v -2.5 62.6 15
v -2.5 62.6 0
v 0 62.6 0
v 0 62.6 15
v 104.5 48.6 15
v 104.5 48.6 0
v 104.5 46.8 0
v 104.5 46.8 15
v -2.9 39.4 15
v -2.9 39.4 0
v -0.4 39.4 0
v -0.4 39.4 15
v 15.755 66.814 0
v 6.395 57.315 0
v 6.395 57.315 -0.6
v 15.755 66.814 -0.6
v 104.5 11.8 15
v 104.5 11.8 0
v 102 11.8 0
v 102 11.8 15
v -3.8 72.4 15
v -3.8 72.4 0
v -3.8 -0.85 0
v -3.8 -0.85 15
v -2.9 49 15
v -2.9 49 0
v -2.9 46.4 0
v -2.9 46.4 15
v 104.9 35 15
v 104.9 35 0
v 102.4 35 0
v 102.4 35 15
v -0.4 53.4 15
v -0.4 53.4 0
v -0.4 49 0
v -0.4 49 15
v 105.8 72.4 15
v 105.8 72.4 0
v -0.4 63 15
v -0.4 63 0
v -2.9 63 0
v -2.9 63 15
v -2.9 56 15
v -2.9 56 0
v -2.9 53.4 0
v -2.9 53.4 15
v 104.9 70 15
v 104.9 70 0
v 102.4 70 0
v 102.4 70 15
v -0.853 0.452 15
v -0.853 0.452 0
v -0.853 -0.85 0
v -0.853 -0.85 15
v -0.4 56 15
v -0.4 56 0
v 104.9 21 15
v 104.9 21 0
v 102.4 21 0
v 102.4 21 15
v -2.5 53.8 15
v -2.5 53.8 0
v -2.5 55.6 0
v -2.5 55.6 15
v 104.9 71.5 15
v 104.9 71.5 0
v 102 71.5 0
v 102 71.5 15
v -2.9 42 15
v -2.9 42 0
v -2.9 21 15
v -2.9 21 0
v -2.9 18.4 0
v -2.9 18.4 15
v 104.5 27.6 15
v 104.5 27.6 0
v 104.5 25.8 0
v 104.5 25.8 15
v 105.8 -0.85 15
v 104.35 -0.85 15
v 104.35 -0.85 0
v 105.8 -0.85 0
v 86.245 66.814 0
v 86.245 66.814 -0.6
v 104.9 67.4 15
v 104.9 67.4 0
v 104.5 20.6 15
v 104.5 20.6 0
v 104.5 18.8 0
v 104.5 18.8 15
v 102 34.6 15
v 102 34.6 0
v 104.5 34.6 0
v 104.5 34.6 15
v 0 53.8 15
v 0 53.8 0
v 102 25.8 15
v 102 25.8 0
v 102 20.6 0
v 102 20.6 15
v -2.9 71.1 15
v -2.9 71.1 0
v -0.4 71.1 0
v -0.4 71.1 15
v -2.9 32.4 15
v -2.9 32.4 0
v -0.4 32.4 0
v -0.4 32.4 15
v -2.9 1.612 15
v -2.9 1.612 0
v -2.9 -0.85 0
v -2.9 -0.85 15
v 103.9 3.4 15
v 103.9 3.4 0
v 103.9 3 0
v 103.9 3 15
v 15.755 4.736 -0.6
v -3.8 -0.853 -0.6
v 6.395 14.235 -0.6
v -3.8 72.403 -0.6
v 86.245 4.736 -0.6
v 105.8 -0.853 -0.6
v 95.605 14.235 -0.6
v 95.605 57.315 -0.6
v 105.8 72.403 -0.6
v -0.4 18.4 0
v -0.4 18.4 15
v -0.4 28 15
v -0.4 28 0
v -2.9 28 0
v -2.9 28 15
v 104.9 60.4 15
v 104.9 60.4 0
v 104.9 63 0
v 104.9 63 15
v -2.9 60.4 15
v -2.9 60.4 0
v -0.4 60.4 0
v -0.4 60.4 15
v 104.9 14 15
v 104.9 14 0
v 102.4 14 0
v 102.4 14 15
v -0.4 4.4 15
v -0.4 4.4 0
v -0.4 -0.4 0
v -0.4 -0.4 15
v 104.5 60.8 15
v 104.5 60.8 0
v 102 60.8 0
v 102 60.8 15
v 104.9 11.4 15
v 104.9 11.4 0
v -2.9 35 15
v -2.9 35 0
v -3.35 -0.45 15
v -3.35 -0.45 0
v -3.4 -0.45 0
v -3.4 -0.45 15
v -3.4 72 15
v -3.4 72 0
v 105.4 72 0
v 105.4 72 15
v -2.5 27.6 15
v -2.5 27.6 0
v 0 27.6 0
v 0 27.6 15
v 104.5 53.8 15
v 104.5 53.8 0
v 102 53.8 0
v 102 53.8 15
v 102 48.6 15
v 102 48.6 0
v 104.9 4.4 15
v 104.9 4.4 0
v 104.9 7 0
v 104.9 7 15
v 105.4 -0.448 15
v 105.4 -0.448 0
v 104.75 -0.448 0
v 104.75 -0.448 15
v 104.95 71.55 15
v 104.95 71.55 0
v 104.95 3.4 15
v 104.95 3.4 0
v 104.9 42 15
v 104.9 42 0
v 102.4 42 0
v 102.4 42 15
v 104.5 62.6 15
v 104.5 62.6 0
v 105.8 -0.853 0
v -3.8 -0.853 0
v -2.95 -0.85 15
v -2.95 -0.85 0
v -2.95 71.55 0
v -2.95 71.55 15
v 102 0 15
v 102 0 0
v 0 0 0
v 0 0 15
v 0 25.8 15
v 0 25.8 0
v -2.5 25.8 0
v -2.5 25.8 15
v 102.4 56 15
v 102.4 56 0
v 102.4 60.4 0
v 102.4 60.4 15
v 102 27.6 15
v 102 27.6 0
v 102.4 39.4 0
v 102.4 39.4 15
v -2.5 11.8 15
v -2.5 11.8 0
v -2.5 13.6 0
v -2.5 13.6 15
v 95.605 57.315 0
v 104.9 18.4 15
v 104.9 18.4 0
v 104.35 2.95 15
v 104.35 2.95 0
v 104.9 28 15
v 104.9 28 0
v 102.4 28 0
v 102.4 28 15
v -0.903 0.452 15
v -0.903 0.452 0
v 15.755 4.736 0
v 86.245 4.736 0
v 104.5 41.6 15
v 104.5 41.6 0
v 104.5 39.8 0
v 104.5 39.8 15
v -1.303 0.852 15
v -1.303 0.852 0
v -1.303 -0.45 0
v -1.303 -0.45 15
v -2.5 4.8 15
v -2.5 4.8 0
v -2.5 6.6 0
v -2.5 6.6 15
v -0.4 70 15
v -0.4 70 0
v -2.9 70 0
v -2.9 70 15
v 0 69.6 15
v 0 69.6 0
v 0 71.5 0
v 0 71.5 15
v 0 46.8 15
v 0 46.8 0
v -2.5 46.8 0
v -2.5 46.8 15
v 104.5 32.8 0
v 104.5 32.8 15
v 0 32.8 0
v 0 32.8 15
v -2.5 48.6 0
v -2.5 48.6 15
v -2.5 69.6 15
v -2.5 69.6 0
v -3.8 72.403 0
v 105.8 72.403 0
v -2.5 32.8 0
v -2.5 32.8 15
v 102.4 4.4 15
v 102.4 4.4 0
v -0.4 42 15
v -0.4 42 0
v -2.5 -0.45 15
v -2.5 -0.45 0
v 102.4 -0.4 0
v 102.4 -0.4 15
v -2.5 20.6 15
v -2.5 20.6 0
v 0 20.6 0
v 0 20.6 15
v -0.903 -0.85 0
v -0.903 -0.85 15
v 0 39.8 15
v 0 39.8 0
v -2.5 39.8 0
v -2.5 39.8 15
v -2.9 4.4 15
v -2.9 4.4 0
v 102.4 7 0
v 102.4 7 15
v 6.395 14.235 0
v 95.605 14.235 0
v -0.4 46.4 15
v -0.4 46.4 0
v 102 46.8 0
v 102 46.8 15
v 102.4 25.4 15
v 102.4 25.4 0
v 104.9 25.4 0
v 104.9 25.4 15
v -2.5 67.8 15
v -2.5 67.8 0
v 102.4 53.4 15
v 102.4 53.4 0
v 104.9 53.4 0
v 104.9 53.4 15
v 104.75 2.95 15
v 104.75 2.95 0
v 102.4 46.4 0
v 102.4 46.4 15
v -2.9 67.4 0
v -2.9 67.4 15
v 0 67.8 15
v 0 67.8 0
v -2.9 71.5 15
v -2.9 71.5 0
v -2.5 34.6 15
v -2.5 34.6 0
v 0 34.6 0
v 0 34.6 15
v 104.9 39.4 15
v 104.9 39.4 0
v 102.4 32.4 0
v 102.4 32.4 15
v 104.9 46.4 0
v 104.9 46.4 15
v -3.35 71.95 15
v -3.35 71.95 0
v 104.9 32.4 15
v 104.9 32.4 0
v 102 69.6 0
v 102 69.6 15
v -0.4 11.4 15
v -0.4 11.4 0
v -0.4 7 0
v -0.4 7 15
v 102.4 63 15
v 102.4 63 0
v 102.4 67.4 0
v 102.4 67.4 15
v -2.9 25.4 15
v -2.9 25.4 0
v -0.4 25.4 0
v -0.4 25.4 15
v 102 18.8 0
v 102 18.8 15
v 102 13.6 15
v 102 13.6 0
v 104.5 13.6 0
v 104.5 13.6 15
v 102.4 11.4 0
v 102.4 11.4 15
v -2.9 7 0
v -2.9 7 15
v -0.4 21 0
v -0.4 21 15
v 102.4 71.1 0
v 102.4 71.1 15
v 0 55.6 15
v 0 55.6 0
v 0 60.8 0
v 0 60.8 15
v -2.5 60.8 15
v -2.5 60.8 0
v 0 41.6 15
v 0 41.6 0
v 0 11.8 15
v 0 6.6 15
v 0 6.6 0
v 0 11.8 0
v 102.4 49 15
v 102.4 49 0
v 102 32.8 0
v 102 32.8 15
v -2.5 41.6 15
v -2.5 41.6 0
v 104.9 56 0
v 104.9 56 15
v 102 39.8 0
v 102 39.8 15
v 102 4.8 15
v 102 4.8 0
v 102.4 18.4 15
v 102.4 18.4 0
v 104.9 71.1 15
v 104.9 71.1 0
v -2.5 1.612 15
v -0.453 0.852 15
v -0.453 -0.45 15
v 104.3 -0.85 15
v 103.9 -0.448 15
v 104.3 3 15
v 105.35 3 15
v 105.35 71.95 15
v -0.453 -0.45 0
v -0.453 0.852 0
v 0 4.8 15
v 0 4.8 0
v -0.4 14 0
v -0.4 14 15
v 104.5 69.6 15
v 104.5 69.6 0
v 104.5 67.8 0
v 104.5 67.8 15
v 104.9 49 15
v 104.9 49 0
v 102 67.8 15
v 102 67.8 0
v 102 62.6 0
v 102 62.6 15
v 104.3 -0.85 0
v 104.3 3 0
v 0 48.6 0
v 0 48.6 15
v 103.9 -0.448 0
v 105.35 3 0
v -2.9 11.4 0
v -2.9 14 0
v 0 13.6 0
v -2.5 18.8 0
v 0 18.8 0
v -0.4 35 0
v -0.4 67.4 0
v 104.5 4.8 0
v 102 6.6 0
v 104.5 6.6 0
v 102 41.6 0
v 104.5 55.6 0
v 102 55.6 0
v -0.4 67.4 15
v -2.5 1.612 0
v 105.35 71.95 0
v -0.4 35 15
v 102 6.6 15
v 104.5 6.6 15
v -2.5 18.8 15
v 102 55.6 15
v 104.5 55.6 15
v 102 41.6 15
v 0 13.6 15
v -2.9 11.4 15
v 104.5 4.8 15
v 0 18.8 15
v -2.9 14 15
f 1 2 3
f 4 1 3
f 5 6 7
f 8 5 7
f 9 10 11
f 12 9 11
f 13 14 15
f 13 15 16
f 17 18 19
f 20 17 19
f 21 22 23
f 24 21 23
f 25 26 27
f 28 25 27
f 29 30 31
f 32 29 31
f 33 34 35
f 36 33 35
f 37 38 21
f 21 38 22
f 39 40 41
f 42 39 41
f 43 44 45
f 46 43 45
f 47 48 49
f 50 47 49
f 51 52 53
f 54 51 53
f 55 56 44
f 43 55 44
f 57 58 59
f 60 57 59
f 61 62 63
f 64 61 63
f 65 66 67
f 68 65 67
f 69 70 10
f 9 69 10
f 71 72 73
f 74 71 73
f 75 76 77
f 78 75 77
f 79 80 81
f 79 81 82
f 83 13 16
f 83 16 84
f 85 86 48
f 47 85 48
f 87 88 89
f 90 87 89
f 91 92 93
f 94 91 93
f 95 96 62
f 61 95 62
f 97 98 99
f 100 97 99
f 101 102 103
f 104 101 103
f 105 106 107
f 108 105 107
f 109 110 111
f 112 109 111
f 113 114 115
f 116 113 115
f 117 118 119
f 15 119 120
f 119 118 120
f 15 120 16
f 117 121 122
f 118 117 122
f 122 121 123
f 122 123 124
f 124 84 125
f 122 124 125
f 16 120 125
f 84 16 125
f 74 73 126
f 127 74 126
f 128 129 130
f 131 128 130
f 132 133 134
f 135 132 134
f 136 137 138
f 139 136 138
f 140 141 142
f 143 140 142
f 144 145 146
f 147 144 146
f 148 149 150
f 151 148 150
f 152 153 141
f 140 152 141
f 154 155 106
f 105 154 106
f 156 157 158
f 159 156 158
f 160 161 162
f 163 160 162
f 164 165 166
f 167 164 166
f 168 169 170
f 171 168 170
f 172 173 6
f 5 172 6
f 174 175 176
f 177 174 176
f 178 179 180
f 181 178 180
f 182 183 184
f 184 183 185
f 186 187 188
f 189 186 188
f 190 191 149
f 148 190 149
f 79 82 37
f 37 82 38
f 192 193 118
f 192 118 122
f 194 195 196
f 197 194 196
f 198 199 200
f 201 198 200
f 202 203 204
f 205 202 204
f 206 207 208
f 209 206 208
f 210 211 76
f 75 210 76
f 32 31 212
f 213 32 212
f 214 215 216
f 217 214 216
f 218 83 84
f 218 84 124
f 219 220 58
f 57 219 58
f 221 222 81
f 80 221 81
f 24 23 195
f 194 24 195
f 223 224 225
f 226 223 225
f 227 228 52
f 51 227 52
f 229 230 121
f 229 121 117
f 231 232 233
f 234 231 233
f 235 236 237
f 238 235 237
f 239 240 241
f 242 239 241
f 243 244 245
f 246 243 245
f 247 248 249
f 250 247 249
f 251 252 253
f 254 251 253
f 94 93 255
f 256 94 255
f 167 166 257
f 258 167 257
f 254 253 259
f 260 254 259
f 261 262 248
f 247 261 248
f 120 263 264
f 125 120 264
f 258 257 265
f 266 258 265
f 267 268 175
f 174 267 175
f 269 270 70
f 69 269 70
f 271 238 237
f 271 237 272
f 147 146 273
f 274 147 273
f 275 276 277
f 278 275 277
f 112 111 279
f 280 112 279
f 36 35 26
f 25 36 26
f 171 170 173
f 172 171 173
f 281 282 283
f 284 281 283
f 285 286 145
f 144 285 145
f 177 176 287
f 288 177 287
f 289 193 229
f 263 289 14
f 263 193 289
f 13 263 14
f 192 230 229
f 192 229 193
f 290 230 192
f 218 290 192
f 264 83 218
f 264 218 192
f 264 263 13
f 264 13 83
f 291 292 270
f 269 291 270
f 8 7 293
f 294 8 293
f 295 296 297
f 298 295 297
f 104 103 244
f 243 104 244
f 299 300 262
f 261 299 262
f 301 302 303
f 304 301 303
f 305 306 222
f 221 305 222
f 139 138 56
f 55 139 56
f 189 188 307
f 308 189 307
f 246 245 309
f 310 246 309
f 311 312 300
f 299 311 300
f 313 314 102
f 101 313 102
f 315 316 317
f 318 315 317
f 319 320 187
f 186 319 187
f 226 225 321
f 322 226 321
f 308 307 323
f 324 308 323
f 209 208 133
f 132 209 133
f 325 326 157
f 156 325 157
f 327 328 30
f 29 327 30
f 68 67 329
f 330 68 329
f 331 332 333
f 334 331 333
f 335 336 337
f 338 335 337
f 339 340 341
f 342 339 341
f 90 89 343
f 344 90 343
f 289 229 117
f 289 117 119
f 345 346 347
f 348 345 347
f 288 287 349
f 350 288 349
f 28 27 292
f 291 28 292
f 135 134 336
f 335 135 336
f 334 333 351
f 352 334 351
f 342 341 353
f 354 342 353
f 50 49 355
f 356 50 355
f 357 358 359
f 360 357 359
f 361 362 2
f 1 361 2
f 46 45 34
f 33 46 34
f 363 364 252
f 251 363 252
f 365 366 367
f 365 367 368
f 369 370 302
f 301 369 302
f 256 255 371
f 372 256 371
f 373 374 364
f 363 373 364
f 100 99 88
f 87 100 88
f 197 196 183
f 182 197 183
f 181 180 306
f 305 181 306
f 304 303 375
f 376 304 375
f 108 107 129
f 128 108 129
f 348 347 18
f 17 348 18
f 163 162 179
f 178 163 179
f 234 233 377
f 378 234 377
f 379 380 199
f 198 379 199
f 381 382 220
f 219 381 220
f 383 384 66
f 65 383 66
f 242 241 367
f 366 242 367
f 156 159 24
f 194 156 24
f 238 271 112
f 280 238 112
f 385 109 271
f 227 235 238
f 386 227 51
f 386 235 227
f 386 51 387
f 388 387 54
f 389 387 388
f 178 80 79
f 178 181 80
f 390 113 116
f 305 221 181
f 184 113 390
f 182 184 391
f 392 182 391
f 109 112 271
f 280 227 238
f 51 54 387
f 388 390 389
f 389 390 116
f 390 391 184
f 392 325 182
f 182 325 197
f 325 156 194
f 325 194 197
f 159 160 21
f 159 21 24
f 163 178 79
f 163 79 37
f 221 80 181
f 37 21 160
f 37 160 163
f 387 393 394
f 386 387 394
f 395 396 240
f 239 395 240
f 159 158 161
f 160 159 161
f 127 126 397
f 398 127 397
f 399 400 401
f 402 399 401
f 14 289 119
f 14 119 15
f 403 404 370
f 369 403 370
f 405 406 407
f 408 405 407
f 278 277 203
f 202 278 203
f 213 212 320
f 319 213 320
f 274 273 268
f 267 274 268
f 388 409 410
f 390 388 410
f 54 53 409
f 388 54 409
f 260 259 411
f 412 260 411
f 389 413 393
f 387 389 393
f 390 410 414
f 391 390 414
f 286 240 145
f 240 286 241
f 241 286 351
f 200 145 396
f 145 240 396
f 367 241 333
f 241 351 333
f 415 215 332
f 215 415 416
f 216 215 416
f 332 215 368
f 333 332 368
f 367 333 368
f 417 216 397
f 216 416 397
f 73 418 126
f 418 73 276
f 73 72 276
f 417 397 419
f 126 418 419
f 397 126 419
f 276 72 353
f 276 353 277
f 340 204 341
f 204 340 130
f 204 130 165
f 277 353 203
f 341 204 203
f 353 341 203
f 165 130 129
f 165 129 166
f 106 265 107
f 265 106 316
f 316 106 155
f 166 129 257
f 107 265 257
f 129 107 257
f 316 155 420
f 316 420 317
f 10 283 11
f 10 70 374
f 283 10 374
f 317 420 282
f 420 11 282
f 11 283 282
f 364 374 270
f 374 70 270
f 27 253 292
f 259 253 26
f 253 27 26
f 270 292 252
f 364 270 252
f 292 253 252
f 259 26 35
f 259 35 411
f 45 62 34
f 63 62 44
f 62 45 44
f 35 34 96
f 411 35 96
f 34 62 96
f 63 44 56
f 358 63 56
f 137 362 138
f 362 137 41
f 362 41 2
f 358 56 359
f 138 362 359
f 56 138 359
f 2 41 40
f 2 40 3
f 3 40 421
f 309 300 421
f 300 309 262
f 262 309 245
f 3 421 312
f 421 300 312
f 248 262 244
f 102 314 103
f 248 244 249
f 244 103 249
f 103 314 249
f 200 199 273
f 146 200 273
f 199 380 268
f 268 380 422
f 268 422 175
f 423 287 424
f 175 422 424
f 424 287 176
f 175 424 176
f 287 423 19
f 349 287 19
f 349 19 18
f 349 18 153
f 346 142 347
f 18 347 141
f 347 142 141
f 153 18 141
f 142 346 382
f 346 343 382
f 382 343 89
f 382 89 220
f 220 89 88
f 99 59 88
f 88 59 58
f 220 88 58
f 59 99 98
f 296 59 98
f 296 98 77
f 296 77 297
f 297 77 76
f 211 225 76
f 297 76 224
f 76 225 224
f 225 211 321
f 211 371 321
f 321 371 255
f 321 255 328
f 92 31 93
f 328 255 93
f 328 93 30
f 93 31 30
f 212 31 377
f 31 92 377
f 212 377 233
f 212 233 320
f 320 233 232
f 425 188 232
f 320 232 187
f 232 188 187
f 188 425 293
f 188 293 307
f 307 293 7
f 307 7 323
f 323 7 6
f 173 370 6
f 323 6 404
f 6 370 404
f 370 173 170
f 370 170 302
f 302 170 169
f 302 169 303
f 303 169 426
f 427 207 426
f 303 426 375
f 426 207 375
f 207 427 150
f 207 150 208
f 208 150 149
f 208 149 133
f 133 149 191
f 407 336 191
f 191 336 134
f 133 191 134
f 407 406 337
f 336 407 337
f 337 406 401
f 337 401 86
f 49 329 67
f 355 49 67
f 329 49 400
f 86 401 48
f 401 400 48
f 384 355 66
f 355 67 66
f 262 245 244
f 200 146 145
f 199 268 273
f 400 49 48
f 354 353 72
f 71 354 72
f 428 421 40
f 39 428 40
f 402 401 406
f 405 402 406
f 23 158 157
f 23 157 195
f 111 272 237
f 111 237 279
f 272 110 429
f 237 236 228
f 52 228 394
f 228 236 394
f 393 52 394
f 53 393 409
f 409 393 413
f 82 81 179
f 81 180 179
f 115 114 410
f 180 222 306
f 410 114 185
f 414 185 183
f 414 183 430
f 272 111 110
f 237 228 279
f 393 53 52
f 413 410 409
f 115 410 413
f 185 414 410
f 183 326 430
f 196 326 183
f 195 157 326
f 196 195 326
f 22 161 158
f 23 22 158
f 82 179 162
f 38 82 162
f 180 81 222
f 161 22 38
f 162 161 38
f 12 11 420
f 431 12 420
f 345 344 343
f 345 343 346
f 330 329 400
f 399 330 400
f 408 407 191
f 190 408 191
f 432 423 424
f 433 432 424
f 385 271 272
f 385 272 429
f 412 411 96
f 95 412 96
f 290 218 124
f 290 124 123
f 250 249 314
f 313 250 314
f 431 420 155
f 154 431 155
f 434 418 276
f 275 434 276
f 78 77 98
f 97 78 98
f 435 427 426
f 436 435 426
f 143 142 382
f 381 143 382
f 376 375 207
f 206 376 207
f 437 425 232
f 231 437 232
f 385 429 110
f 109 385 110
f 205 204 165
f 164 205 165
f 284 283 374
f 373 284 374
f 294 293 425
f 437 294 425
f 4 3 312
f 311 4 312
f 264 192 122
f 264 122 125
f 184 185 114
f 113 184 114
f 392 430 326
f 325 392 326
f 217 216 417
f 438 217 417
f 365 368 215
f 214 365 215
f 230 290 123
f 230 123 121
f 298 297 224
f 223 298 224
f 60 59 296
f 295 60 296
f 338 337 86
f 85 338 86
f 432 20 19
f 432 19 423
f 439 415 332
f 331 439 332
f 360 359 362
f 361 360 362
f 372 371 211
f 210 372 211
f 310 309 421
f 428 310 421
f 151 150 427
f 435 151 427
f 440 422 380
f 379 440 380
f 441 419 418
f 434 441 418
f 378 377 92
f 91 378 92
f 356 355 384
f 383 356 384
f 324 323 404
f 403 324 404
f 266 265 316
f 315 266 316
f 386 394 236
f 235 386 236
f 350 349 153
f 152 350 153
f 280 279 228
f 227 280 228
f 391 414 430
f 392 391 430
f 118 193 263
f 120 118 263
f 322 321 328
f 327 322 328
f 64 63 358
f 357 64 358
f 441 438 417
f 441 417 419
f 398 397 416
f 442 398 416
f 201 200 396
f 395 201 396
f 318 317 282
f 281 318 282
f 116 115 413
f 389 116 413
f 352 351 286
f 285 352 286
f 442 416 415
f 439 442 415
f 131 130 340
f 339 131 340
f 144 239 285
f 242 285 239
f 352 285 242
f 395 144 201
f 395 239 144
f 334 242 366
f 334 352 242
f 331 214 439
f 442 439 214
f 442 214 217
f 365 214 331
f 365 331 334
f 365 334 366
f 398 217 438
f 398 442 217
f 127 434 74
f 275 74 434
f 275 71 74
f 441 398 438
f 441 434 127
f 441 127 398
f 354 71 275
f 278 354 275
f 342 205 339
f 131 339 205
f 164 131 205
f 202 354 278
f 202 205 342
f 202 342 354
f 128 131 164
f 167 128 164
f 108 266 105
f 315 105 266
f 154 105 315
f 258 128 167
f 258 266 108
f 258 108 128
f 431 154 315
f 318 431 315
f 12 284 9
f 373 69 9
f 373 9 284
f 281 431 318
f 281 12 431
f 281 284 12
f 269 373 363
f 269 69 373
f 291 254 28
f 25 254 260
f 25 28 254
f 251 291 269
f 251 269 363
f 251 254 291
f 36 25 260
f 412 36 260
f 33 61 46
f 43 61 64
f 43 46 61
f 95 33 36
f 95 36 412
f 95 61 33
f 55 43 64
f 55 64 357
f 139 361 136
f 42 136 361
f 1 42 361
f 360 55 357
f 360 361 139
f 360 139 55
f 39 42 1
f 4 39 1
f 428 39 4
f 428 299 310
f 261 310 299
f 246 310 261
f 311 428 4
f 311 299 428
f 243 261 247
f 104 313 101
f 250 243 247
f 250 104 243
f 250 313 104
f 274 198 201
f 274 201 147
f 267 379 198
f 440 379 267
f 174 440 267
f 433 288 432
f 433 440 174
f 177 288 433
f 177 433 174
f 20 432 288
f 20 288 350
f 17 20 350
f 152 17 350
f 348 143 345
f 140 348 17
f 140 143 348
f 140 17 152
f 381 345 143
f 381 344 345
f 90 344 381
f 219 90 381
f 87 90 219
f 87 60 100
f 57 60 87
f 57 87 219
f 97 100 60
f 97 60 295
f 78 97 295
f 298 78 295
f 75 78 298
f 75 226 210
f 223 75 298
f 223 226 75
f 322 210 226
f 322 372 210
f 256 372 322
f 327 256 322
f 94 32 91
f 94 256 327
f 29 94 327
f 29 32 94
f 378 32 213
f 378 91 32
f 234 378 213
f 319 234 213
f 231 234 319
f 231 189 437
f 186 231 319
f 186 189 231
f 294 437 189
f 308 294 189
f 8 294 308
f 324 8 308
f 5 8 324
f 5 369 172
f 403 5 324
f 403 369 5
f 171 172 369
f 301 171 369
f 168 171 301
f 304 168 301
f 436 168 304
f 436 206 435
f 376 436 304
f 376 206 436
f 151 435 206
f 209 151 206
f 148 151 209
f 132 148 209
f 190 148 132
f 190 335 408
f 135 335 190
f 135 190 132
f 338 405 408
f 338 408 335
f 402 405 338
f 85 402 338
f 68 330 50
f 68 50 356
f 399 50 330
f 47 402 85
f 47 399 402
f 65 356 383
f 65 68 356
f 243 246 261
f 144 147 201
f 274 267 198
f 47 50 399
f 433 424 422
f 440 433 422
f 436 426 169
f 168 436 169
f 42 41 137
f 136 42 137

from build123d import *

# Parameters (mm, degrees)
F1_DEPTH = 15
F2_W     = 109.6
F2_H     = 73.25603
F3_DEPTH = 0.6


with BuildPart() as f1:
    # F0 (on Top) → F1 (new body)
    with BuildSketch(Plane.XY):
        Polygon((51, 0), (0, 0), (0, 4.8), (-2.5, 4.8), (-2.5, 6.6), (0, 6.6), (0, 7), (0, 11.8), (-2.5, 11.8), (-2.5, 13.6), (0, 13.6), (0, 14), (0, 18.8), (-2.5, 18.8), (-2.5, 20.6), (0, 20.6), (0, 21), (0, 25.8), (-2.5, 25.8), (-2.5, 27.6), (0, 27.6), (0, 28), (0, 32.8), (-2.5, 32.8), (-2.5, 34.6), (0, 34.6), (0, 35), (0, 39.8), (-2.5, 39.8), (-2.5, 41.6), (0, 41.6), (0, 42), (0, 46.8), (-2.5, 46.8), (-2.5, 48.6), (0, 48.6), (0, 49), (0, 53.8), (-2.5, 53.8), (-2.5, 55.6), (0, 55.6), (0, 56), (0, 60.8), (-2.5, 60.8), (-2.5, 62.6), (0, 62.6), (0, 63), (0, 67.8), (-2.5, 67.8), (-2.5, 69.6), (0, 69.6), (0, 70), (0, 71.5), (-2.9, 71.5), (-2.9, 71.1), (-0.4, 71.1), (-0.4, 70), (-2.9, 70), (-2.9, 67.4), (-0.4, 67.4), (-0.4, 63), (-2.9, 63), (-2.9, 60.4), (-0.4, 60.4), (-0.4, 56), (-2.9, 56), (-2.9, 53.4), (-0.4, 53.4), (-0.4, 49), (-2.9, 49), (-2.9, 46.4), (-0.4, 46.4), (-0.4, 42), (-2.9, 42), (-2.9, 39.4), (-0.4, 39.4), (-0.4, 35), (-2.9, 35), (-2.9, 32.4), (-0.4, 32.4), (-0.4, 28), (-2.9, 28), (-2.9, 25.4), (-0.4, 25.4), (-0.4, 21), (-2.9, 21), (-2.9, 18.4), (-0.4, 18.4), (-0.4, 14), (-2.9, 14), (-2.9, 11.4), (-0.4, 11.4), (-0.4, 7), (-2.9, 7), (-2.9, 4.4), (-0.4, 4.4), (-0.4, 0), (-0.4, -0.4), (51, -0.4), (102.4, -0.4), (102.4, 0), (102.4, 4.4), (104.9, 4.4), (104.9, 7), (102.4, 7), (102.4, 11.4), (104.9, 11.4), (104.9, 14), (102.4, 14), (102.4, 18.4), (104.9, 18.4), (104.9, 21), (102.4, 21), (102.4, 25.4), (104.9, 25.4), (104.9, 28), (102.4, 28), (102.4, 32.4), (104.9, 32.4), (104.9, 35), (102.4, 35), (102.4, 39.4), (104.9, 39.4), (104.9, 42), (102.4, 42), (102.4, 46.4), (104.9, 46.4), (104.9, 49), (102.4, 49), (102.4, 53.4), (104.9, 53.4), (104.9, 56), (102.4, 56), (102.4, 60.4), (104.9, 60.4), (104.9, 63), (102.4, 63), (102.4, 67.4), (104.9, 67.4), (104.9, 70), (102.4, 70), (102.4, 71.1), (104.9, 71.1), (104.9, 71.5), (102, 71.5), (102, 70), (102, 69.6), (104.5, 69.6), (104.5, 67.8), (102, 67.8), (102, 63), (102, 62.6), (104.5, 62.6), (104.5, 60.8), (102, 60.8), (102, 56), (102, 55.6), (104.5, 55.6), (104.5, 53.8), (102, 53.8), (102, 49), (102, 48.6), (104.5, 48.6), (104.5, 46.8), (102, 46.8), (102, 42), (102, 41.6), (104.5, 41.6), (104.5, 39.8), (102, 39.8), (102, 35), (102, 34.6), (104.5, 34.6), (104.5, 32.8), (102, 32.8), (102, 28), (102, 27.6), (104.5, 27.6), (104.5, 25.8), (102, 25.8), (102, 21), (102, 20.6), (104.5, 20.6), (104.5, 18.8), (102, 18.8), (102, 14), (102, 13.6), (104.5, 13.6), (104.5, 11.8), (102, 11.8), (102, 7), (102, 6.6), (104.5, 6.6), (104.5, 4.8), (102, 4.8), (102, 0), align=None)
        Polygon((-2.95, 3.40002), (-2.95, 71.55), (51, 71.55), (104.95, 71.55), (104.95, 3.40002), (103.899943, 3.40002), (103.899943, 3.00002), (103.9, -0.44826), (-0.452649, -0.45), (-0.452649, 0), (-0.452649, 0.852392), (-1.302649, 0.852392), (-1.302649, -0.45), (-2.5, -0.45), (-2.5, 1.61228), (-2.9, 1.61228), (-2.9, -0.85), (-0.902649, -0.85), (-0.902649, 0.452392), (-0.852649, 0.452392), (-0.852649, -0.85), (104.3, -0.85), (104.3, 3.00002), (105.35, 3.00002), (105.35, 71.95), (51, 71.95), (-3.35, 71.95), (-3.35, -0.45), (-3.4, -0.45), (-3.4, 72), (105.4, 72), (105.4, 0), (105.4, -0.44826), (104.749937, -0.448271), (104.749937, 2.95002), (104.349937, 2.95002), (104.35, -0.850024), (105.8, -0.85), (105.8, 72.4), (-3.8, 72.4), (-3.8, -0.85), (-2.95, -0.85), align=None)
    extrude(amount=F1_DEPTH)


with BuildPart() as f3:
    # F2 (on Top) → F3 (new body)
    with BuildSketch(Plane.XY):
        with Locations((51, 35.775)):
            Rectangle(F2_W, F2_H)
        Polygon((6.395185, 57.314999), (15.754556, 66.814446), (86.245444, 66.814446), (95.604815, 57.314999), (95.604815, 14.235001), (86.245444, 4.735554), (15.754556, 4.735554), (6.395185, 14.235001), align=None, mode=Mode.SUBTRACT)
    extrude(amount=-F3_DEPTH)


solid = Compound([f1.part, f3.part])
